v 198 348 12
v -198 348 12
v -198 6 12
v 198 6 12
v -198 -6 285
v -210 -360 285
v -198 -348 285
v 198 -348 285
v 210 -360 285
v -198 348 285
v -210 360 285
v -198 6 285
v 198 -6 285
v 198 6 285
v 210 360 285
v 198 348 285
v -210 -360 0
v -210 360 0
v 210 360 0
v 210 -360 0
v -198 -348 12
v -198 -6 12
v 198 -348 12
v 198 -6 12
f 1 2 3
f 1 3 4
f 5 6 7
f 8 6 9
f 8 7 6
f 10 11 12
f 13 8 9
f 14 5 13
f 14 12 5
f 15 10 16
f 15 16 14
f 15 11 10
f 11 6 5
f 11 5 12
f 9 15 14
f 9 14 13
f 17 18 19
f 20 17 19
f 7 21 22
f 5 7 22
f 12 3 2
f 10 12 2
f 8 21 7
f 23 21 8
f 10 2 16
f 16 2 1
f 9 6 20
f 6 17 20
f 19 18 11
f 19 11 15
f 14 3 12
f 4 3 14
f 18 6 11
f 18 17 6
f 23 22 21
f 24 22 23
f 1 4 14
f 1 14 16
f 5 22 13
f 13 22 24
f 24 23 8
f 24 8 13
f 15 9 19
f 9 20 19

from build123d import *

# Parameters (mm, degrees)
SKETCH_1_W      = 420
SKETCH_1_H      = 720
EXTRUDE_1_DEPTH = 12
SKETCH_2_W      = 420
SKETCH_2_H      = 720
SKETCH_2_W_2    = 396
SKETCH_2_H_2    = 342
EXTRUDE_2_DEPTH = 273


with BuildPart() as part:
    # ｽｹｯﾁ1 → ﾎﾞｽ - 押し出し1 (new body)
    with BuildSketch(Plane.XY):
        Rectangle(SKETCH_1_W, SKETCH_1_H)
    extrude(amount=EXTRUDE_1_DEPTH)

    # ｽｹｯﾁ2 → ﾎﾞｽ - 押し出し2 (add)
    with BuildSketch(Plane.XY.offset(12)):
        Rectangle(SKETCH_2_W, SKETCH_2_H)
        with Locations((0, 177)):
            Rectangle(SKETCH_2_W_2, SKETCH_2_H_2, mode=Mode.SUBTRACT)
        with Locations((0, -177)):
            Rectangle(SKETCH_2_W_2, SKETCH_2_H_2, mode=Mode.SUBTRACT)
    extrude(amount=EXTRUDE_2_DEPTH)


solid = part.part
